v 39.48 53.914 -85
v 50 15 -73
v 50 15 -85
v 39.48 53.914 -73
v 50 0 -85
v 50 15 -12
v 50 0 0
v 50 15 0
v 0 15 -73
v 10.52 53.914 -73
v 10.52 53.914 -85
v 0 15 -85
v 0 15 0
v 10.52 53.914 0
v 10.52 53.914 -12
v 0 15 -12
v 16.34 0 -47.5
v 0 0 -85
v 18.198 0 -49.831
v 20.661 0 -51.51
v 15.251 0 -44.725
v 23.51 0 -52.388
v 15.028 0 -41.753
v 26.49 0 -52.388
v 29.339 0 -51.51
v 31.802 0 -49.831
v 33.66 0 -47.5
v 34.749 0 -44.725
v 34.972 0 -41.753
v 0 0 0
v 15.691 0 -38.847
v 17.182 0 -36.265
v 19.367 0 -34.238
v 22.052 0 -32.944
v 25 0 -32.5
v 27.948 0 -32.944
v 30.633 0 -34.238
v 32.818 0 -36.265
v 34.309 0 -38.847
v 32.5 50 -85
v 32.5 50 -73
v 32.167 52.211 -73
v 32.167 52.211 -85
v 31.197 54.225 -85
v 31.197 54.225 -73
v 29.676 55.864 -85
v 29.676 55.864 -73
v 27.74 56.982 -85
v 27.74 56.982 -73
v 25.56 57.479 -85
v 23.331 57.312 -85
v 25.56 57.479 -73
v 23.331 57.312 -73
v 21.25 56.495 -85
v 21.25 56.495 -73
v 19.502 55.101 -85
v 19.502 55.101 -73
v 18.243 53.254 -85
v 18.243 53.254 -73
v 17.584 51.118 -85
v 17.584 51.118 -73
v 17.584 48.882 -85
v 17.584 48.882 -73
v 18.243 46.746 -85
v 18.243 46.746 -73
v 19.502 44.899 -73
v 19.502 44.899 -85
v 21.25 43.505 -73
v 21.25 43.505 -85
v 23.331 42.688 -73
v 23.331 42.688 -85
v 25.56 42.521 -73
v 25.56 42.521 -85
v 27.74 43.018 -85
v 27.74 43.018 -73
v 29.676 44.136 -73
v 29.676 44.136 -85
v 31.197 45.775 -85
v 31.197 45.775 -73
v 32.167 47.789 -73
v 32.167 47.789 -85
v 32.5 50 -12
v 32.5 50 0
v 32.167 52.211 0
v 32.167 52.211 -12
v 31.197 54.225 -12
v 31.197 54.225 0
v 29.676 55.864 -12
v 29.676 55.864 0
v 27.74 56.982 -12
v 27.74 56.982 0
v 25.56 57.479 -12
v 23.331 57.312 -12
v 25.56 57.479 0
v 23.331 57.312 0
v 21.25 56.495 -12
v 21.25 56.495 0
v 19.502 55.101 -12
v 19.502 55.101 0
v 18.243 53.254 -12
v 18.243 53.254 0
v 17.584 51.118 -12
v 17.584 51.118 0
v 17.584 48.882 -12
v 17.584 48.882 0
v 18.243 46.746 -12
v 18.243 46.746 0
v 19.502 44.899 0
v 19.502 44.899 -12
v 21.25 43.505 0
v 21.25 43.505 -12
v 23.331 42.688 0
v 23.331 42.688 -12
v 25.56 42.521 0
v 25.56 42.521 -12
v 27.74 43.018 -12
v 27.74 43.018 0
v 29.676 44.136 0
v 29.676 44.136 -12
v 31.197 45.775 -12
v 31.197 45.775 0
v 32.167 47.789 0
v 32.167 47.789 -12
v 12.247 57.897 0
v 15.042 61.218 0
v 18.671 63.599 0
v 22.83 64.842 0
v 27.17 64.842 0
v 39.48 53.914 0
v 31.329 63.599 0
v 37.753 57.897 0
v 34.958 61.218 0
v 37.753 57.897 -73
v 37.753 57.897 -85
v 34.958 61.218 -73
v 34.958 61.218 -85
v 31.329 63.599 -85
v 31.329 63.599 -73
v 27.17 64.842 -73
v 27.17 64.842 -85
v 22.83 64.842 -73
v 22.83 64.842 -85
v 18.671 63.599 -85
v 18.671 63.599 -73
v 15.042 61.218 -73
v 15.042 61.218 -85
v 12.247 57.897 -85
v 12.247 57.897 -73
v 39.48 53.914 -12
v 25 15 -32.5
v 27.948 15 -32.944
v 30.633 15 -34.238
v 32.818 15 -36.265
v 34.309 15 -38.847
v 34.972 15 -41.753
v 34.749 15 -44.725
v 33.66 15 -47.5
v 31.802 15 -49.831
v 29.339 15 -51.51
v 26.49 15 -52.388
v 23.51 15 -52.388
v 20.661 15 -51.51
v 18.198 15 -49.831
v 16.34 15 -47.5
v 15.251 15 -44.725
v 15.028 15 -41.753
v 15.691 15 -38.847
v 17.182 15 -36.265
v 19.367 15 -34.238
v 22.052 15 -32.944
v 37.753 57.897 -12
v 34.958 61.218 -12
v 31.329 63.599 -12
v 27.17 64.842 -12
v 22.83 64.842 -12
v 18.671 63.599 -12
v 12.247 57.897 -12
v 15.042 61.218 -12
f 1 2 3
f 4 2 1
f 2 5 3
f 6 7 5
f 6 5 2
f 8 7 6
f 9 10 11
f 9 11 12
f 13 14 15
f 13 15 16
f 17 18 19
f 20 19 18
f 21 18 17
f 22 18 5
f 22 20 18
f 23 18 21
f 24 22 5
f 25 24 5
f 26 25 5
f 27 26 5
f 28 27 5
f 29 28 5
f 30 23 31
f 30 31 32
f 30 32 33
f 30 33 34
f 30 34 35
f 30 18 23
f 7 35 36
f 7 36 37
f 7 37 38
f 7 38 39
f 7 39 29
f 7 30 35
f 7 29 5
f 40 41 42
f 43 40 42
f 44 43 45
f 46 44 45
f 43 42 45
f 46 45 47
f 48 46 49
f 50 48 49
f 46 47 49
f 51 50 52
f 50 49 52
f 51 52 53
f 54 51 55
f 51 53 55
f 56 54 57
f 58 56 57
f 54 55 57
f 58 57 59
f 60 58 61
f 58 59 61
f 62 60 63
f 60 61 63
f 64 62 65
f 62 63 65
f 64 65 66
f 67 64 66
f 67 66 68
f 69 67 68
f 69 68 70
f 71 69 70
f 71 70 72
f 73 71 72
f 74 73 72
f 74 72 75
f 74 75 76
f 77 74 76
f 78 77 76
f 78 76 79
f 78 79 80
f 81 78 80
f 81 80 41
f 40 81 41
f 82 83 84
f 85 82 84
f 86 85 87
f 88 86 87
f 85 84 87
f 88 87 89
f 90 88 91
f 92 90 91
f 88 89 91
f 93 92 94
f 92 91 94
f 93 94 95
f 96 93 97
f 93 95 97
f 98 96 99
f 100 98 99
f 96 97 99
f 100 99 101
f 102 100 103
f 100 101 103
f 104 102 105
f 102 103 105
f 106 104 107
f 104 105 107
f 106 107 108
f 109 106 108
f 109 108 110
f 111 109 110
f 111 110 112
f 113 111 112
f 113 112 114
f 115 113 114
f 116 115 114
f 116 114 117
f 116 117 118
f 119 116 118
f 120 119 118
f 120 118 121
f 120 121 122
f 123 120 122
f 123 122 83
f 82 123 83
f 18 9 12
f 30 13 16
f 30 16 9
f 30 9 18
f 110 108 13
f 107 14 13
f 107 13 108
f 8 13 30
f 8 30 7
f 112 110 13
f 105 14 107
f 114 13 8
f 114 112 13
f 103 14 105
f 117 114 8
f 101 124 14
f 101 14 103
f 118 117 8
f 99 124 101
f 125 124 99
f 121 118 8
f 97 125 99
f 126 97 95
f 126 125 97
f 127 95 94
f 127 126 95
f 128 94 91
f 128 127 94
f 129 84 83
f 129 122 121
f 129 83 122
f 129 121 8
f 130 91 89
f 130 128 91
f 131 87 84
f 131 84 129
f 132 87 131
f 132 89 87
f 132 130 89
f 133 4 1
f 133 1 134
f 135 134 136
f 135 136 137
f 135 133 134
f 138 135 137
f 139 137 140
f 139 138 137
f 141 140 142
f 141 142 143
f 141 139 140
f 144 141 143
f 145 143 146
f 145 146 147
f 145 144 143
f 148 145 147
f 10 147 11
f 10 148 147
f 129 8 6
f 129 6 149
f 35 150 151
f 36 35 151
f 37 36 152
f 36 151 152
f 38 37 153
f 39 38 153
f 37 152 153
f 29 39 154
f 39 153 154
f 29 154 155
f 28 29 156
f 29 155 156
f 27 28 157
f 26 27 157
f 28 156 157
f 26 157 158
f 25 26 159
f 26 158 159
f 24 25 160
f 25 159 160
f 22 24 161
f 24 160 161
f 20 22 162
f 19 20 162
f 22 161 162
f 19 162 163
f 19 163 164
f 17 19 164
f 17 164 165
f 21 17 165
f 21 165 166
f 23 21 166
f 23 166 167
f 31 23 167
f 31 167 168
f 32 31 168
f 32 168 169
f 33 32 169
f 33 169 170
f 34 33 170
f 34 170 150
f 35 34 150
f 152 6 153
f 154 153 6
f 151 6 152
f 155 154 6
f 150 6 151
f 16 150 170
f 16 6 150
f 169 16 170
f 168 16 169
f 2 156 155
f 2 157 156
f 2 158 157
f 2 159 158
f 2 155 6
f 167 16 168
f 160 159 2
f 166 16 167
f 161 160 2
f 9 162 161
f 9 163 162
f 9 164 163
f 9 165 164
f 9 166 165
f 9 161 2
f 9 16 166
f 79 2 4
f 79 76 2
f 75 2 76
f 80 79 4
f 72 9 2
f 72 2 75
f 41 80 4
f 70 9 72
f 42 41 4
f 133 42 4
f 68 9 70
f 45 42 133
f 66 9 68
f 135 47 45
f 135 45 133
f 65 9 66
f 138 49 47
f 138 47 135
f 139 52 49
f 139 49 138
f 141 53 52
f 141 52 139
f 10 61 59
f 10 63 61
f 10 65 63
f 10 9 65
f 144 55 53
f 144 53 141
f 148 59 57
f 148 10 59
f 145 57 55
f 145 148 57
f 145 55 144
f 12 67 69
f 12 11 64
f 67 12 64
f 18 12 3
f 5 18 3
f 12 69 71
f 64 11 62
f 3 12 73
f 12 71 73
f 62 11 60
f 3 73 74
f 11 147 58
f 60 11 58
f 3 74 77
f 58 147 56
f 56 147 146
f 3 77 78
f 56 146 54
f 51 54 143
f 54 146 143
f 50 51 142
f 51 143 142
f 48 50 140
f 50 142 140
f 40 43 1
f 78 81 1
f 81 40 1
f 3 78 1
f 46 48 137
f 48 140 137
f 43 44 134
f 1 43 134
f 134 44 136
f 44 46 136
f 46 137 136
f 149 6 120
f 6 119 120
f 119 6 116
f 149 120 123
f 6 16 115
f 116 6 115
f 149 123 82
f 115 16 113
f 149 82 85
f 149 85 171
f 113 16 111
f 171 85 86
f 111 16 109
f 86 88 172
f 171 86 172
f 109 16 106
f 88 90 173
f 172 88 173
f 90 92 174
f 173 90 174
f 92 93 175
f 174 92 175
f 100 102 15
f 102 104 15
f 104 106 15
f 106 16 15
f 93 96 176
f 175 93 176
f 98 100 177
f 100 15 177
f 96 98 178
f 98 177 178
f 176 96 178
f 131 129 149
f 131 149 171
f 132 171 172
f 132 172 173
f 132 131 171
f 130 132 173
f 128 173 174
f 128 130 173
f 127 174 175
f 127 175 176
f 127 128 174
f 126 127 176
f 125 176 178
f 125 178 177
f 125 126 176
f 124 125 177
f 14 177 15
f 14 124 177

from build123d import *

# Parameters (mm, degrees)
SKETCH1_R           = 15
SKETCH1_R_2         = 7.5
BOSS_EXTRUDE1_DEPTH = 85
SKETCH2_W           = 61
SKETCH2_H           = 50.965296902
CUT_EXTRUDE1_DEPTH  = 71
SKETCH3_R           = 10
CUT_EXTRUDE2_DEPTH  = 23


with BuildPart() as part:
    # Sketch1 → Boss-Extrude1 (new body)
    # profile 1 of 2: a face of its own
    with BuildSketch(Plane.XY):
        with BuildLine():
            Line((0, 15), (0, 0))
            Line((0, 0), (50, 0))
            Line((50, 0), (50, 15))
            Line((50, 15), (39.480230589, 53.914450421))
            ThreePointArc((39.480230589, 53.914450421), (39.869489884, 51.974403855), (40, 50))
            ThreePointArc((40, 50), (23.025596145, 35.130510116), (10.519769411, 53.914450421))
            Line((10.519769411, 53.914450421), (0, 15))
        make_face()
    # profile 2 of 2: a face of its own
    with BuildSketch(Plane.XY):
        with Locations((25, 50)):
            Circle(SKETCH1_R)
        with Locations((25, 50)):
            Circle(SKETCH1_R_2, mode=Mode.SUBTRACT)
    extrude(amount=-BOSS_EXTRUDE1_DEPTH)

    # Sketch2 → Cut-Extrude1 (cut)
    with BuildSketch(Plane(origin=(0, 0, 0), x_dir=(0, 0, -1), z_dir=(1, 0, 0))):
        with Locations((42.5, 40.482648451)):
            Rectangle(SKETCH2_W, SKETCH2_H)
    extrude(amount=CUT_EXTRUDE1_DEPTH, mode=Mode.SUBTRACT)

    # Sketch3 → Cut-Extrude2 (cut)
    with BuildSketch(Plane(origin=(0, 15, 0), x_dir=(1, 0, 0), z_dir=(0, 1, 0))):
        with Locations(Location((25, 42.5, 0), (0, 0, 270))):
            Circle(SKETCH3_R)
    extrude(amount=-CUT_EXTRUDE2_DEPTH, mode=Mode.SUBTRACT)


solid = part.part
